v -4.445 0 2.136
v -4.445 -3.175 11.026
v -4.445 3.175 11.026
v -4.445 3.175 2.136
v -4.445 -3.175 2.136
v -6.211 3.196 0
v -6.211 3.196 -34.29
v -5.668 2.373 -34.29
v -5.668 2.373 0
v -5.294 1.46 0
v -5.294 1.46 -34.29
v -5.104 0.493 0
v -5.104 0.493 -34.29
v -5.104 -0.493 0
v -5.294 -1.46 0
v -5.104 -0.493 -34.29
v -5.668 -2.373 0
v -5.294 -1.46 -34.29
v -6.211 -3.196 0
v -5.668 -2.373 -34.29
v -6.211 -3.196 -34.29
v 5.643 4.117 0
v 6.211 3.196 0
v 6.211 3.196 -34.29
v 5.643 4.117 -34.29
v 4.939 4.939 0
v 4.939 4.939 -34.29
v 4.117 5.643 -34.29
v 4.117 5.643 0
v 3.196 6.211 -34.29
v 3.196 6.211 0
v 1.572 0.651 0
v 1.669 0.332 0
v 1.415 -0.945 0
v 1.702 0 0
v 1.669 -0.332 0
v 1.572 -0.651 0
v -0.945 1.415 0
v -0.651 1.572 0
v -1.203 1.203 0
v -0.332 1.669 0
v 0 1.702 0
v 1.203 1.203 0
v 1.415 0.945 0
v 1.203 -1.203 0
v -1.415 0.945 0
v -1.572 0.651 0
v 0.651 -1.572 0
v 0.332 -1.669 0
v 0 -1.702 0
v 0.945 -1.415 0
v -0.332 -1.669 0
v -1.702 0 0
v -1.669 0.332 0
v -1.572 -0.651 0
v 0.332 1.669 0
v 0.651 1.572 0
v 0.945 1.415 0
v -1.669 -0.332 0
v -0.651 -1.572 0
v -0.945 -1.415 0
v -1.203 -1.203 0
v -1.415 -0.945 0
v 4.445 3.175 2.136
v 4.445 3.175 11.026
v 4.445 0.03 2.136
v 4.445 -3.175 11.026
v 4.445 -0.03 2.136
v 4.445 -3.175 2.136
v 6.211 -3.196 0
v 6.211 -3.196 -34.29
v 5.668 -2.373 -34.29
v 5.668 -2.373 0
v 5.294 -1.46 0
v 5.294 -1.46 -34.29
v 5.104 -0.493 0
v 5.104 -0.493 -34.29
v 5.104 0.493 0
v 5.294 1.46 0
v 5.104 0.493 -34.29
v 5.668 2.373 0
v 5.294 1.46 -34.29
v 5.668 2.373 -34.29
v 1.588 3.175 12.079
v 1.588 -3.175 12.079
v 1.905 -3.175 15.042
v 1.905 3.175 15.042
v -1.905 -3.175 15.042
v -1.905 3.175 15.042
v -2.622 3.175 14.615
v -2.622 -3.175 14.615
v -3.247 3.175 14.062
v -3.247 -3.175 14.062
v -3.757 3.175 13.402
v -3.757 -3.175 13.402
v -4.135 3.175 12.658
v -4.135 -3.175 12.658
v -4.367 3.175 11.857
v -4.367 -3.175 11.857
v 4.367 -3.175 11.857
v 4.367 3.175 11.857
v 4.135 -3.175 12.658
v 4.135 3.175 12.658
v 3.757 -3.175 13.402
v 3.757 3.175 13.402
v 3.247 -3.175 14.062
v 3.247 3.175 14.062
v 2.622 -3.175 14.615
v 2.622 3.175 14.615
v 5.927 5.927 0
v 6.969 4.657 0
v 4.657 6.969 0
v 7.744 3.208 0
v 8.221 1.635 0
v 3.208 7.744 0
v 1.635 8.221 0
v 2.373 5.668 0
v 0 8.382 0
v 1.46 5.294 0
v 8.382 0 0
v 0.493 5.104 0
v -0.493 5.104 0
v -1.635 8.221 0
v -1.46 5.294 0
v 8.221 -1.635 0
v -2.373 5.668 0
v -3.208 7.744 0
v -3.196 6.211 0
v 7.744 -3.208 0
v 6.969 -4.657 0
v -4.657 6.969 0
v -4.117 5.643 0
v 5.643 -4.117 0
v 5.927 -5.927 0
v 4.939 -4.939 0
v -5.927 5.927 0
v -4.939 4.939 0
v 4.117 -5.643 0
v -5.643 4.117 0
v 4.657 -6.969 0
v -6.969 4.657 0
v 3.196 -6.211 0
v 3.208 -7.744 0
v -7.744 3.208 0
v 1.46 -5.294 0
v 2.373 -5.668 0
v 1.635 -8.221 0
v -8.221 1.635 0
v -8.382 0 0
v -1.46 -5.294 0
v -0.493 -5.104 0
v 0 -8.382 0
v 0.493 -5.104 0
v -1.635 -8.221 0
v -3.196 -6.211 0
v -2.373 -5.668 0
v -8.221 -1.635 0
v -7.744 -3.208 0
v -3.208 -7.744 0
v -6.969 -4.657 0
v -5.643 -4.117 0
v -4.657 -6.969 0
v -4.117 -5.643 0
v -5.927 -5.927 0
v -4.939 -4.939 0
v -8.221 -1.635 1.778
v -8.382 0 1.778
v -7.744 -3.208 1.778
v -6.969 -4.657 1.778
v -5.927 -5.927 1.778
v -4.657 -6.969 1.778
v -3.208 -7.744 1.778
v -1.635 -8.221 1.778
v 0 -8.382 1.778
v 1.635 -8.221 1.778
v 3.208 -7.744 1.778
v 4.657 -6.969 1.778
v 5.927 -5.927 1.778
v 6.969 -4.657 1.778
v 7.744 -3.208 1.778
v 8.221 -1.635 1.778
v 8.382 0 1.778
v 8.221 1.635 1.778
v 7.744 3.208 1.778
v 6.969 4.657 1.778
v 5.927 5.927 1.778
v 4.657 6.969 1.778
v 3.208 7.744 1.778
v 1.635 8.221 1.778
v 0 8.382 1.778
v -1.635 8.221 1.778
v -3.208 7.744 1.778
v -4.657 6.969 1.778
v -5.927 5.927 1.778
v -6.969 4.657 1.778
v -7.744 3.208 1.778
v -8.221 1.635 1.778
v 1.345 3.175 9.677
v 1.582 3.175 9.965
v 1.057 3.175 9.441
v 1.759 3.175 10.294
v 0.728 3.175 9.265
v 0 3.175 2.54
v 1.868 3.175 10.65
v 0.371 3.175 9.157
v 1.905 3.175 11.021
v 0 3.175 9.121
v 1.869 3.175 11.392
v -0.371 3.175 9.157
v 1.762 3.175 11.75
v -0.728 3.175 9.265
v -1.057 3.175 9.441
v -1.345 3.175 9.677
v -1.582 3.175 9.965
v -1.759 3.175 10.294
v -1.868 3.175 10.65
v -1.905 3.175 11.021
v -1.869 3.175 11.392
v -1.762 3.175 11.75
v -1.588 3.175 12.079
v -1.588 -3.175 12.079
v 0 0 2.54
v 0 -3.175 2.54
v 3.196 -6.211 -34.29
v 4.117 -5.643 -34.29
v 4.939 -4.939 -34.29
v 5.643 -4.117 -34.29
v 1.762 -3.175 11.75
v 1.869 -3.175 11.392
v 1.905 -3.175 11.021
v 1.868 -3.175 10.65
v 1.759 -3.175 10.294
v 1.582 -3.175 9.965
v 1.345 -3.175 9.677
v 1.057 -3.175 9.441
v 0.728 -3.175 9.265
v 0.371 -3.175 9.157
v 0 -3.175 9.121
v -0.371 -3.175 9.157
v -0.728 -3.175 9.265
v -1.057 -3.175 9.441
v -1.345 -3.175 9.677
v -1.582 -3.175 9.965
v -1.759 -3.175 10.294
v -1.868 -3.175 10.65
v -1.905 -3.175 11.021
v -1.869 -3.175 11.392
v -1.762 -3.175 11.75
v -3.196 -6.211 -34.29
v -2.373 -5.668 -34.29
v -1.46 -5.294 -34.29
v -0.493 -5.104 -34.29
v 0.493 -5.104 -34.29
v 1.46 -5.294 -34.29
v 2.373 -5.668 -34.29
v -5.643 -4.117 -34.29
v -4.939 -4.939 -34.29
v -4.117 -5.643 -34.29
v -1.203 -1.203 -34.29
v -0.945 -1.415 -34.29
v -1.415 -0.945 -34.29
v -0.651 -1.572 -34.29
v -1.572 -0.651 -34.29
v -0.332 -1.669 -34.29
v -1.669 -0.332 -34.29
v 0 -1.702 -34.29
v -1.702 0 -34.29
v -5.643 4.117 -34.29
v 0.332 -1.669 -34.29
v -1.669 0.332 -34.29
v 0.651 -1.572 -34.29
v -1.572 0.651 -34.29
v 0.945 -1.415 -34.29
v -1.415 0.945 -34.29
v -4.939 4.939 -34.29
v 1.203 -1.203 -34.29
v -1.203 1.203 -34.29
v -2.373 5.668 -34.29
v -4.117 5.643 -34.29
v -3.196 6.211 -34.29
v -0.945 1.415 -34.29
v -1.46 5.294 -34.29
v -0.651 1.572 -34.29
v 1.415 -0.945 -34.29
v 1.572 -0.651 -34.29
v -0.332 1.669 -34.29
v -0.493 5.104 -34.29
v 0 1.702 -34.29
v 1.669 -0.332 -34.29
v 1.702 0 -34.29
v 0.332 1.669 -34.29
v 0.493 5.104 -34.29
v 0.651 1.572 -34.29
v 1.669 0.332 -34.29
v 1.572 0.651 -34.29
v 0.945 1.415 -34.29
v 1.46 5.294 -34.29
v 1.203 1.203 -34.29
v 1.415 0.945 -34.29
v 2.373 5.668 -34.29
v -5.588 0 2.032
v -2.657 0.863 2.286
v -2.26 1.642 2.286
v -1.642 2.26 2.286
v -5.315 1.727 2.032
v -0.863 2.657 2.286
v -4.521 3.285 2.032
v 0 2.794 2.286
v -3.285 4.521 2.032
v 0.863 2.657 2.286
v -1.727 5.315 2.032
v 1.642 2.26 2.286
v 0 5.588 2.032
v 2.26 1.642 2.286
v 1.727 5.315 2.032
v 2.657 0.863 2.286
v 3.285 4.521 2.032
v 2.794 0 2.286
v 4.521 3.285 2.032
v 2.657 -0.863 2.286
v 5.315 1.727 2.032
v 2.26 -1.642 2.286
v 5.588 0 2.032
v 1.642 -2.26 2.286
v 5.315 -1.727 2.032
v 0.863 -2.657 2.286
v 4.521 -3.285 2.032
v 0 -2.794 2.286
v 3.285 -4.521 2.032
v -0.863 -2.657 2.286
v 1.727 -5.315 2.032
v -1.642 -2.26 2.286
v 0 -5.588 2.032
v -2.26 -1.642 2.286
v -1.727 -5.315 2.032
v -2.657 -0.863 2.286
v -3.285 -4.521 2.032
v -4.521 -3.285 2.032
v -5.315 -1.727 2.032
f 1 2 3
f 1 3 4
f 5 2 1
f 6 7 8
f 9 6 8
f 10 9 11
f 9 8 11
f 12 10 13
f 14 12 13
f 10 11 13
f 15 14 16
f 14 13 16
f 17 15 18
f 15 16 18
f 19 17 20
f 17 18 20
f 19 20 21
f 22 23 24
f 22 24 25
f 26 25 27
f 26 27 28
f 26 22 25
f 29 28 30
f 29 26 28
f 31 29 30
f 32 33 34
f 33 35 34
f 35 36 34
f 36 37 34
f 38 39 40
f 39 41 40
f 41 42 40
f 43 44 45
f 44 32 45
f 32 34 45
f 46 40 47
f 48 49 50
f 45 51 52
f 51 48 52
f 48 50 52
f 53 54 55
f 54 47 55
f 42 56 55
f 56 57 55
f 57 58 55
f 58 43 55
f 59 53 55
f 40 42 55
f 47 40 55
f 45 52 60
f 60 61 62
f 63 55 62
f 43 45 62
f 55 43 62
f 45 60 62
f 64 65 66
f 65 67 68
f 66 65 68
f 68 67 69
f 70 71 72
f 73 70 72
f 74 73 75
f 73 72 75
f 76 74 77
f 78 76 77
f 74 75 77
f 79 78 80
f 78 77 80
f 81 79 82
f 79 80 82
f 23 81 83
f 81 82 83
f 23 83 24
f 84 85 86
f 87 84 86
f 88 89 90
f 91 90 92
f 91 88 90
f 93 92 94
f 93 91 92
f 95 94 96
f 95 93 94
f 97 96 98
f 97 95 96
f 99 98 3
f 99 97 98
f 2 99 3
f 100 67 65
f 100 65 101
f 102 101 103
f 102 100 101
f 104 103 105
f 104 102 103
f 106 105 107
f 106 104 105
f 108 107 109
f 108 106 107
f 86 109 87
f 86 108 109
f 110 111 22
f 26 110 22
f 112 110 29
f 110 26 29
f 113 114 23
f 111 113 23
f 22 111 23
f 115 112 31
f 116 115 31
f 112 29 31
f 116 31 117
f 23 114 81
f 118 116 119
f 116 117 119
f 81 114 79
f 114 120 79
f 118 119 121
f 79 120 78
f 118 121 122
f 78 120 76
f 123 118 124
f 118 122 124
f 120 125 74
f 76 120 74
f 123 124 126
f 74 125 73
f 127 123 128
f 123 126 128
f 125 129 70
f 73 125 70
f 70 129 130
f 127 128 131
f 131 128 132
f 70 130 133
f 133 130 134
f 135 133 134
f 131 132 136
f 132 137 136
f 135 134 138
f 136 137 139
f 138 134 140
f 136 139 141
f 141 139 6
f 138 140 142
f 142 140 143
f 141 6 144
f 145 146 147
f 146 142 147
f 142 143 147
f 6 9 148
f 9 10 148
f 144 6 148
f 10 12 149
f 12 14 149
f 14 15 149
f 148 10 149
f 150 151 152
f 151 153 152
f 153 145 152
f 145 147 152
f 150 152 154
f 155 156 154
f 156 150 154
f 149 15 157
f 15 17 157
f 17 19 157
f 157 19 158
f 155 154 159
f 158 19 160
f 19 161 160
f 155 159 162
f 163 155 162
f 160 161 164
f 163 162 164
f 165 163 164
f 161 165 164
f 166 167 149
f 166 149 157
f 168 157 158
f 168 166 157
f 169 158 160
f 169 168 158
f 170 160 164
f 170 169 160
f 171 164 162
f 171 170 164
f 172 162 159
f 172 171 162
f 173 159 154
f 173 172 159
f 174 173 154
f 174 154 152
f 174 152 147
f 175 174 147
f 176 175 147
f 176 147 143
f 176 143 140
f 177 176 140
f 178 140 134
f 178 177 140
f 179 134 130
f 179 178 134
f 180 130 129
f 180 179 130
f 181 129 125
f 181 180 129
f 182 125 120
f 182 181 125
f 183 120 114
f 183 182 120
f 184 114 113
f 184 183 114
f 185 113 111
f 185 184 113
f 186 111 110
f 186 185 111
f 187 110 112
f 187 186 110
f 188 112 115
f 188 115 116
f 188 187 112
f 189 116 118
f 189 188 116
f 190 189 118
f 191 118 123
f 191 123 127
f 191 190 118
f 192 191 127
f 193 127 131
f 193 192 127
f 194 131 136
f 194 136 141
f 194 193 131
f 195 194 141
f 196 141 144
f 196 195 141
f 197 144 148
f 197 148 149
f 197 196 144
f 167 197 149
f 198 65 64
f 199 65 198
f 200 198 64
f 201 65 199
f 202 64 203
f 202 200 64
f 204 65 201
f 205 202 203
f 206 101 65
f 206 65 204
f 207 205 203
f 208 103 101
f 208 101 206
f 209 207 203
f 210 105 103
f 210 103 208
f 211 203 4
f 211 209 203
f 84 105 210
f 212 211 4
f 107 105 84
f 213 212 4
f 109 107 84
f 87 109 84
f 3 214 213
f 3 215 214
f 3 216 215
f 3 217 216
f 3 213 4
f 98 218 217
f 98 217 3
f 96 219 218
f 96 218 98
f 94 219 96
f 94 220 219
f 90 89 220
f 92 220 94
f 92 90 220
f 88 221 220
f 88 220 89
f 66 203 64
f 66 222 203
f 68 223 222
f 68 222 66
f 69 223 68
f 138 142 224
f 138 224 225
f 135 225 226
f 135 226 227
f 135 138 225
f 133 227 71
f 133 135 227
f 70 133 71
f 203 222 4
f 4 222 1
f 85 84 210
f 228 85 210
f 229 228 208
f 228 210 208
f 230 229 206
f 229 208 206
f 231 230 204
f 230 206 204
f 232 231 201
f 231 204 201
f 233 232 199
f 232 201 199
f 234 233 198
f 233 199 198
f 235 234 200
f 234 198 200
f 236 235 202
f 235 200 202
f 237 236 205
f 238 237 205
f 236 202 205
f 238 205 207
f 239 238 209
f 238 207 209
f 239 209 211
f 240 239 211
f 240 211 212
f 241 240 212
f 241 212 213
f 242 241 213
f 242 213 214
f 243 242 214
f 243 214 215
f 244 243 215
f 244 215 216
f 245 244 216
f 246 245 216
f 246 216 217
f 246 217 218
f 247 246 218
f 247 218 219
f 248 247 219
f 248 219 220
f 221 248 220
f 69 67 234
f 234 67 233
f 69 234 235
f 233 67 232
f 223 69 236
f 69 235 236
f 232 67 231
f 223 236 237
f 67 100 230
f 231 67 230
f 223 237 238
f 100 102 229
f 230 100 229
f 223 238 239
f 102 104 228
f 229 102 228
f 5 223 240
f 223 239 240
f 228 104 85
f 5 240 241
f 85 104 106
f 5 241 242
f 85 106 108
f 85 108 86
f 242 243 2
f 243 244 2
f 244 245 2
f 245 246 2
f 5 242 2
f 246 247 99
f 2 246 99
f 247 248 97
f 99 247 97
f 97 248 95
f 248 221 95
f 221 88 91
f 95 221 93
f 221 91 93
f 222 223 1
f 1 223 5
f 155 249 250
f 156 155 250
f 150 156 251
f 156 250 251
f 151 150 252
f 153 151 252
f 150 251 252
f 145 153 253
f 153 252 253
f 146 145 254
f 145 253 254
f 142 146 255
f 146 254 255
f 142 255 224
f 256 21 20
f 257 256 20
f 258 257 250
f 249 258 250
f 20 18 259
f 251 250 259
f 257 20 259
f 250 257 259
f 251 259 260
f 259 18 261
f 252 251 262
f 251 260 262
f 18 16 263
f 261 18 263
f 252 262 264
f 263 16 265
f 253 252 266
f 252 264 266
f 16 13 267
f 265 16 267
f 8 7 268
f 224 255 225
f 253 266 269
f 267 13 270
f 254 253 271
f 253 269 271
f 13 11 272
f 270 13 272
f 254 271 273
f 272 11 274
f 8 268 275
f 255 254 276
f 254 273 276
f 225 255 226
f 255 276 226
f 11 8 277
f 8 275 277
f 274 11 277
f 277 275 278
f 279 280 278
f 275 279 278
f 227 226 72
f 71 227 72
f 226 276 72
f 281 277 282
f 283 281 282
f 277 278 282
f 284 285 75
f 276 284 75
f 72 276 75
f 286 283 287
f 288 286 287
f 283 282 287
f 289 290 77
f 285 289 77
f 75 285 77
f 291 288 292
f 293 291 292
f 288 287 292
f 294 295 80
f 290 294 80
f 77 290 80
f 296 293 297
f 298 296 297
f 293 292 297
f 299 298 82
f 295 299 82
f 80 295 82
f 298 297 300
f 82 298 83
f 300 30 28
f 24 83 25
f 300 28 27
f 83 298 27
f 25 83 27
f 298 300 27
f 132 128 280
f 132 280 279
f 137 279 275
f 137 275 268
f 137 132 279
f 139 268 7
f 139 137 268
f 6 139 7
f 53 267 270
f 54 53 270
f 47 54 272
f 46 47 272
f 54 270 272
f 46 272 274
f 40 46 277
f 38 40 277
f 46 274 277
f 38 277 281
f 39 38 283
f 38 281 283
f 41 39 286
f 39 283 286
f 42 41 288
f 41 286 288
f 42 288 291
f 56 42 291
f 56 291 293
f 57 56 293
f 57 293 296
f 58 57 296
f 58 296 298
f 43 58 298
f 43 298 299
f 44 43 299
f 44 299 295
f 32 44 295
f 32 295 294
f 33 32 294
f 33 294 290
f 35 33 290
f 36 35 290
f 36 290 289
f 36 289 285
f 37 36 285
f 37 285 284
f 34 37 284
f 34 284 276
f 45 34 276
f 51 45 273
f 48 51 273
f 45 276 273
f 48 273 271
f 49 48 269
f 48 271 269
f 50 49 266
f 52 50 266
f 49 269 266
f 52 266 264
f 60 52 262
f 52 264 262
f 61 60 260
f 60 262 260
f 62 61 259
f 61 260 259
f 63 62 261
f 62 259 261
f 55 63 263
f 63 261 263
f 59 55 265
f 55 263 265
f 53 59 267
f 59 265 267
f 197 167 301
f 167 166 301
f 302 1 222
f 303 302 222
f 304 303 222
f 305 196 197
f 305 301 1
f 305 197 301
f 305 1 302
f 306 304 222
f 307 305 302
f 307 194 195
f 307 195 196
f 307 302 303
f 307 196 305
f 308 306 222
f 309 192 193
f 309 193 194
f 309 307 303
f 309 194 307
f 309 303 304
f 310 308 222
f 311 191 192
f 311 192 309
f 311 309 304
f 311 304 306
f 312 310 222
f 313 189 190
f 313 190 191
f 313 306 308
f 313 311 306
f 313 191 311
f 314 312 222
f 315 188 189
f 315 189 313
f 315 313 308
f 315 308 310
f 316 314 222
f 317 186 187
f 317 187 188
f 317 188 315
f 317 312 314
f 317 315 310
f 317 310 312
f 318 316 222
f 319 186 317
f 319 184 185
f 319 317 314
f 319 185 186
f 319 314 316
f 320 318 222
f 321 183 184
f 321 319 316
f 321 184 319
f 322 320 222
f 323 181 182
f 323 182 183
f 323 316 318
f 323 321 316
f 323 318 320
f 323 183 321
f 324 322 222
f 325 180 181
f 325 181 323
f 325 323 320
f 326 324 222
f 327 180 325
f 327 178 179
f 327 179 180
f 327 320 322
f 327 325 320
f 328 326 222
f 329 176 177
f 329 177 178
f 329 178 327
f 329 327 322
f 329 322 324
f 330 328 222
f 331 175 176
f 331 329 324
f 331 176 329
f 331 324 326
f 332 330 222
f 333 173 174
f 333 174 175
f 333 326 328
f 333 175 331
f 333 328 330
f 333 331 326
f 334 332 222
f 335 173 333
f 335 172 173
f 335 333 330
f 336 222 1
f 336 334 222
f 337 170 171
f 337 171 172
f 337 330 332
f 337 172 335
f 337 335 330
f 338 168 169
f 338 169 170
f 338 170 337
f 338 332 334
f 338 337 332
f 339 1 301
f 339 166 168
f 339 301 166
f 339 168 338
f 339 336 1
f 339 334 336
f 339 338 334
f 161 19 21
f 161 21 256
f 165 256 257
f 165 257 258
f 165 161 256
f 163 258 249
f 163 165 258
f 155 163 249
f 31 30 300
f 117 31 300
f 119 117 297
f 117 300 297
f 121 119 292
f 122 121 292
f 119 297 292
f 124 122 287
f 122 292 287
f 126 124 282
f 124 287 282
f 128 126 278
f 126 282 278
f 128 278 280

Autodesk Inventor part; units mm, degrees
ref_plane "YZ Plane" through (0, 0, 0) normal (1, 0, 0) x (0, 1, 0)
ref_plane "XZ Plane" through (0, 0, 0) normal (0, 1, 0) x (-1, 0, 0)
ref_plane "XY Plane" through (0, 0, 0) normal (0, 0, 1) x (1, 0, 0)
sketch "Sketch1" plane through (0, 0, 0) normal (0, 0, 1) x (1, 0, 0)
  circle A0 centre (0, 0) radius 6.985
  dimension "d0" = 13.97
extrude "Extrusion1" add sketch "Sketch1" against normal blind 34.29
sketch "Sketch2" plane through (0, 0, -34.29) normal (0, 0, -1) x (-1, 0, 0)
  circle A0 centre (0, 0) radius 1.7018
  dimension "d3" = 3.4036
extrude "Extrusion2" cut sketch "Sketch2" against normal blind 36.322
sketch "Sketch3" plane through (0, 0, -34.29) normal (0, 0, -1) x (-1, 0, 0)
  circle A0 centre (0, 0) radius 6.985 projected
  arc A1 (-3.1957, 6.2111) -> (3.1957, 6.2111) centre (0, 10.16) ccw
  circle A2 centre (0, 0) radius 6.985 projected
  line L0 (0, 10.16) -> (0, 0) construction
  dimension "d6" = 10.16
  dimension "d7" = 5.08
extrude "Extrusion3" cut sketch "Sketch3" against normal through all contours A1 A0 picked at (-0.9288, 6.328)
pattern_circular "Circular Pattern1" count 4 over 360 about axis through (0, 0, -34.29) along (0, 0, 1) of "Extrusion3"
sketch "Sketch4" plane through (0, 0, 0) normal (0, 1, 0) x (-1, 0, 0)
  line L0 (0, 0) -> (8.382, 0)
  line L1 (8.382, 0) -> (8.382, 1.778)
  line L2 (8.382, 1.778) -> (0, 2.54)
  line L3 (0, 2.54) -> (0, 0)
  line L4 (-3.1957, 0) -> (3.1957, 0) projected
  line L5 (0, -41.656) -> (0, 9.906) projected
  dimension "d13" = 8.382
  dimension "d14" = 1.778
  dimension "d15" = 2.54
revolve "Revolution1" add sketch "Sketch4" angle 360 about axis through (0, 0, -10) along (0, 0, 1)
sketch "Sketch5" plane through (0, 0, 0) normal (0, 1, 0) x (-1, 0, 0)
  arc A0 (0, 6.5809) -> (4.445, 11.0259) centre (0, 11.0259) ccw construction
  line L0 (0, 2.54) -> (-8.382, 1.778) projected
  line L1 (0, 2.54) -> (8.382, 1.778) projected
  line L2 (0, 2.54) -> (0, 11.0259) construction
  line L3 (-4.445, 11.0259) -> (-4.445, 2.1359)
  line L4 (4.445, 11.0259) -> (4.445, 2.1359)
  arc A1 (-4.445, 11.0259) -> (0, 6.5809) centre (0, 11.0259) ccw construction
  arc A2 (4.445, 11.0259) -> (-4.445, 11.0259) centre (0, 11.0259) ccw
  point P0 (0, 0)
  dimension "d17" = 8.89
  dimension "d18" = 8.89
extrude "Extrusion4" add sketch "Sketch5" along normal mid plane 6.35
sketch "Sketch6" plane through (0, 3.175, 0) normal (0, 1, 0) x (1, 0, 0)
  arc A0 (-4.445, -11.0259) -> (4.445, -11.0259) centre (0, -11.0259) ccw projected
  arc A1 (1.5875, -12.0789) -> (-1.5875, -12.0789) centre (0, -11.0259) ccw
  line L0 (1.5875, -12.0789) -> (1.905, -15.042)
  line L1 (-1.5875, -12.0789) -> (-1.905, -15.042)
  arc A2 (-1.5875, -12.0789) -> (1.5875, -12.0789) centre (0, -11.0259) ccw construction
  line L2 (1.905, -15.042) -> (-1.905, -15.042) construction
  line L3 (1.5875, -12.0789) -> (-1.5875, -12.0789) construction
  point P0 (0, 0)
  dimension "d22" = 3.81
  dimension "d23" = 3.175
  dimension "d24" = 3.81
extrude "Extrusion5" cut sketch "Sketch6" against normal through all
properties part number "Top"
